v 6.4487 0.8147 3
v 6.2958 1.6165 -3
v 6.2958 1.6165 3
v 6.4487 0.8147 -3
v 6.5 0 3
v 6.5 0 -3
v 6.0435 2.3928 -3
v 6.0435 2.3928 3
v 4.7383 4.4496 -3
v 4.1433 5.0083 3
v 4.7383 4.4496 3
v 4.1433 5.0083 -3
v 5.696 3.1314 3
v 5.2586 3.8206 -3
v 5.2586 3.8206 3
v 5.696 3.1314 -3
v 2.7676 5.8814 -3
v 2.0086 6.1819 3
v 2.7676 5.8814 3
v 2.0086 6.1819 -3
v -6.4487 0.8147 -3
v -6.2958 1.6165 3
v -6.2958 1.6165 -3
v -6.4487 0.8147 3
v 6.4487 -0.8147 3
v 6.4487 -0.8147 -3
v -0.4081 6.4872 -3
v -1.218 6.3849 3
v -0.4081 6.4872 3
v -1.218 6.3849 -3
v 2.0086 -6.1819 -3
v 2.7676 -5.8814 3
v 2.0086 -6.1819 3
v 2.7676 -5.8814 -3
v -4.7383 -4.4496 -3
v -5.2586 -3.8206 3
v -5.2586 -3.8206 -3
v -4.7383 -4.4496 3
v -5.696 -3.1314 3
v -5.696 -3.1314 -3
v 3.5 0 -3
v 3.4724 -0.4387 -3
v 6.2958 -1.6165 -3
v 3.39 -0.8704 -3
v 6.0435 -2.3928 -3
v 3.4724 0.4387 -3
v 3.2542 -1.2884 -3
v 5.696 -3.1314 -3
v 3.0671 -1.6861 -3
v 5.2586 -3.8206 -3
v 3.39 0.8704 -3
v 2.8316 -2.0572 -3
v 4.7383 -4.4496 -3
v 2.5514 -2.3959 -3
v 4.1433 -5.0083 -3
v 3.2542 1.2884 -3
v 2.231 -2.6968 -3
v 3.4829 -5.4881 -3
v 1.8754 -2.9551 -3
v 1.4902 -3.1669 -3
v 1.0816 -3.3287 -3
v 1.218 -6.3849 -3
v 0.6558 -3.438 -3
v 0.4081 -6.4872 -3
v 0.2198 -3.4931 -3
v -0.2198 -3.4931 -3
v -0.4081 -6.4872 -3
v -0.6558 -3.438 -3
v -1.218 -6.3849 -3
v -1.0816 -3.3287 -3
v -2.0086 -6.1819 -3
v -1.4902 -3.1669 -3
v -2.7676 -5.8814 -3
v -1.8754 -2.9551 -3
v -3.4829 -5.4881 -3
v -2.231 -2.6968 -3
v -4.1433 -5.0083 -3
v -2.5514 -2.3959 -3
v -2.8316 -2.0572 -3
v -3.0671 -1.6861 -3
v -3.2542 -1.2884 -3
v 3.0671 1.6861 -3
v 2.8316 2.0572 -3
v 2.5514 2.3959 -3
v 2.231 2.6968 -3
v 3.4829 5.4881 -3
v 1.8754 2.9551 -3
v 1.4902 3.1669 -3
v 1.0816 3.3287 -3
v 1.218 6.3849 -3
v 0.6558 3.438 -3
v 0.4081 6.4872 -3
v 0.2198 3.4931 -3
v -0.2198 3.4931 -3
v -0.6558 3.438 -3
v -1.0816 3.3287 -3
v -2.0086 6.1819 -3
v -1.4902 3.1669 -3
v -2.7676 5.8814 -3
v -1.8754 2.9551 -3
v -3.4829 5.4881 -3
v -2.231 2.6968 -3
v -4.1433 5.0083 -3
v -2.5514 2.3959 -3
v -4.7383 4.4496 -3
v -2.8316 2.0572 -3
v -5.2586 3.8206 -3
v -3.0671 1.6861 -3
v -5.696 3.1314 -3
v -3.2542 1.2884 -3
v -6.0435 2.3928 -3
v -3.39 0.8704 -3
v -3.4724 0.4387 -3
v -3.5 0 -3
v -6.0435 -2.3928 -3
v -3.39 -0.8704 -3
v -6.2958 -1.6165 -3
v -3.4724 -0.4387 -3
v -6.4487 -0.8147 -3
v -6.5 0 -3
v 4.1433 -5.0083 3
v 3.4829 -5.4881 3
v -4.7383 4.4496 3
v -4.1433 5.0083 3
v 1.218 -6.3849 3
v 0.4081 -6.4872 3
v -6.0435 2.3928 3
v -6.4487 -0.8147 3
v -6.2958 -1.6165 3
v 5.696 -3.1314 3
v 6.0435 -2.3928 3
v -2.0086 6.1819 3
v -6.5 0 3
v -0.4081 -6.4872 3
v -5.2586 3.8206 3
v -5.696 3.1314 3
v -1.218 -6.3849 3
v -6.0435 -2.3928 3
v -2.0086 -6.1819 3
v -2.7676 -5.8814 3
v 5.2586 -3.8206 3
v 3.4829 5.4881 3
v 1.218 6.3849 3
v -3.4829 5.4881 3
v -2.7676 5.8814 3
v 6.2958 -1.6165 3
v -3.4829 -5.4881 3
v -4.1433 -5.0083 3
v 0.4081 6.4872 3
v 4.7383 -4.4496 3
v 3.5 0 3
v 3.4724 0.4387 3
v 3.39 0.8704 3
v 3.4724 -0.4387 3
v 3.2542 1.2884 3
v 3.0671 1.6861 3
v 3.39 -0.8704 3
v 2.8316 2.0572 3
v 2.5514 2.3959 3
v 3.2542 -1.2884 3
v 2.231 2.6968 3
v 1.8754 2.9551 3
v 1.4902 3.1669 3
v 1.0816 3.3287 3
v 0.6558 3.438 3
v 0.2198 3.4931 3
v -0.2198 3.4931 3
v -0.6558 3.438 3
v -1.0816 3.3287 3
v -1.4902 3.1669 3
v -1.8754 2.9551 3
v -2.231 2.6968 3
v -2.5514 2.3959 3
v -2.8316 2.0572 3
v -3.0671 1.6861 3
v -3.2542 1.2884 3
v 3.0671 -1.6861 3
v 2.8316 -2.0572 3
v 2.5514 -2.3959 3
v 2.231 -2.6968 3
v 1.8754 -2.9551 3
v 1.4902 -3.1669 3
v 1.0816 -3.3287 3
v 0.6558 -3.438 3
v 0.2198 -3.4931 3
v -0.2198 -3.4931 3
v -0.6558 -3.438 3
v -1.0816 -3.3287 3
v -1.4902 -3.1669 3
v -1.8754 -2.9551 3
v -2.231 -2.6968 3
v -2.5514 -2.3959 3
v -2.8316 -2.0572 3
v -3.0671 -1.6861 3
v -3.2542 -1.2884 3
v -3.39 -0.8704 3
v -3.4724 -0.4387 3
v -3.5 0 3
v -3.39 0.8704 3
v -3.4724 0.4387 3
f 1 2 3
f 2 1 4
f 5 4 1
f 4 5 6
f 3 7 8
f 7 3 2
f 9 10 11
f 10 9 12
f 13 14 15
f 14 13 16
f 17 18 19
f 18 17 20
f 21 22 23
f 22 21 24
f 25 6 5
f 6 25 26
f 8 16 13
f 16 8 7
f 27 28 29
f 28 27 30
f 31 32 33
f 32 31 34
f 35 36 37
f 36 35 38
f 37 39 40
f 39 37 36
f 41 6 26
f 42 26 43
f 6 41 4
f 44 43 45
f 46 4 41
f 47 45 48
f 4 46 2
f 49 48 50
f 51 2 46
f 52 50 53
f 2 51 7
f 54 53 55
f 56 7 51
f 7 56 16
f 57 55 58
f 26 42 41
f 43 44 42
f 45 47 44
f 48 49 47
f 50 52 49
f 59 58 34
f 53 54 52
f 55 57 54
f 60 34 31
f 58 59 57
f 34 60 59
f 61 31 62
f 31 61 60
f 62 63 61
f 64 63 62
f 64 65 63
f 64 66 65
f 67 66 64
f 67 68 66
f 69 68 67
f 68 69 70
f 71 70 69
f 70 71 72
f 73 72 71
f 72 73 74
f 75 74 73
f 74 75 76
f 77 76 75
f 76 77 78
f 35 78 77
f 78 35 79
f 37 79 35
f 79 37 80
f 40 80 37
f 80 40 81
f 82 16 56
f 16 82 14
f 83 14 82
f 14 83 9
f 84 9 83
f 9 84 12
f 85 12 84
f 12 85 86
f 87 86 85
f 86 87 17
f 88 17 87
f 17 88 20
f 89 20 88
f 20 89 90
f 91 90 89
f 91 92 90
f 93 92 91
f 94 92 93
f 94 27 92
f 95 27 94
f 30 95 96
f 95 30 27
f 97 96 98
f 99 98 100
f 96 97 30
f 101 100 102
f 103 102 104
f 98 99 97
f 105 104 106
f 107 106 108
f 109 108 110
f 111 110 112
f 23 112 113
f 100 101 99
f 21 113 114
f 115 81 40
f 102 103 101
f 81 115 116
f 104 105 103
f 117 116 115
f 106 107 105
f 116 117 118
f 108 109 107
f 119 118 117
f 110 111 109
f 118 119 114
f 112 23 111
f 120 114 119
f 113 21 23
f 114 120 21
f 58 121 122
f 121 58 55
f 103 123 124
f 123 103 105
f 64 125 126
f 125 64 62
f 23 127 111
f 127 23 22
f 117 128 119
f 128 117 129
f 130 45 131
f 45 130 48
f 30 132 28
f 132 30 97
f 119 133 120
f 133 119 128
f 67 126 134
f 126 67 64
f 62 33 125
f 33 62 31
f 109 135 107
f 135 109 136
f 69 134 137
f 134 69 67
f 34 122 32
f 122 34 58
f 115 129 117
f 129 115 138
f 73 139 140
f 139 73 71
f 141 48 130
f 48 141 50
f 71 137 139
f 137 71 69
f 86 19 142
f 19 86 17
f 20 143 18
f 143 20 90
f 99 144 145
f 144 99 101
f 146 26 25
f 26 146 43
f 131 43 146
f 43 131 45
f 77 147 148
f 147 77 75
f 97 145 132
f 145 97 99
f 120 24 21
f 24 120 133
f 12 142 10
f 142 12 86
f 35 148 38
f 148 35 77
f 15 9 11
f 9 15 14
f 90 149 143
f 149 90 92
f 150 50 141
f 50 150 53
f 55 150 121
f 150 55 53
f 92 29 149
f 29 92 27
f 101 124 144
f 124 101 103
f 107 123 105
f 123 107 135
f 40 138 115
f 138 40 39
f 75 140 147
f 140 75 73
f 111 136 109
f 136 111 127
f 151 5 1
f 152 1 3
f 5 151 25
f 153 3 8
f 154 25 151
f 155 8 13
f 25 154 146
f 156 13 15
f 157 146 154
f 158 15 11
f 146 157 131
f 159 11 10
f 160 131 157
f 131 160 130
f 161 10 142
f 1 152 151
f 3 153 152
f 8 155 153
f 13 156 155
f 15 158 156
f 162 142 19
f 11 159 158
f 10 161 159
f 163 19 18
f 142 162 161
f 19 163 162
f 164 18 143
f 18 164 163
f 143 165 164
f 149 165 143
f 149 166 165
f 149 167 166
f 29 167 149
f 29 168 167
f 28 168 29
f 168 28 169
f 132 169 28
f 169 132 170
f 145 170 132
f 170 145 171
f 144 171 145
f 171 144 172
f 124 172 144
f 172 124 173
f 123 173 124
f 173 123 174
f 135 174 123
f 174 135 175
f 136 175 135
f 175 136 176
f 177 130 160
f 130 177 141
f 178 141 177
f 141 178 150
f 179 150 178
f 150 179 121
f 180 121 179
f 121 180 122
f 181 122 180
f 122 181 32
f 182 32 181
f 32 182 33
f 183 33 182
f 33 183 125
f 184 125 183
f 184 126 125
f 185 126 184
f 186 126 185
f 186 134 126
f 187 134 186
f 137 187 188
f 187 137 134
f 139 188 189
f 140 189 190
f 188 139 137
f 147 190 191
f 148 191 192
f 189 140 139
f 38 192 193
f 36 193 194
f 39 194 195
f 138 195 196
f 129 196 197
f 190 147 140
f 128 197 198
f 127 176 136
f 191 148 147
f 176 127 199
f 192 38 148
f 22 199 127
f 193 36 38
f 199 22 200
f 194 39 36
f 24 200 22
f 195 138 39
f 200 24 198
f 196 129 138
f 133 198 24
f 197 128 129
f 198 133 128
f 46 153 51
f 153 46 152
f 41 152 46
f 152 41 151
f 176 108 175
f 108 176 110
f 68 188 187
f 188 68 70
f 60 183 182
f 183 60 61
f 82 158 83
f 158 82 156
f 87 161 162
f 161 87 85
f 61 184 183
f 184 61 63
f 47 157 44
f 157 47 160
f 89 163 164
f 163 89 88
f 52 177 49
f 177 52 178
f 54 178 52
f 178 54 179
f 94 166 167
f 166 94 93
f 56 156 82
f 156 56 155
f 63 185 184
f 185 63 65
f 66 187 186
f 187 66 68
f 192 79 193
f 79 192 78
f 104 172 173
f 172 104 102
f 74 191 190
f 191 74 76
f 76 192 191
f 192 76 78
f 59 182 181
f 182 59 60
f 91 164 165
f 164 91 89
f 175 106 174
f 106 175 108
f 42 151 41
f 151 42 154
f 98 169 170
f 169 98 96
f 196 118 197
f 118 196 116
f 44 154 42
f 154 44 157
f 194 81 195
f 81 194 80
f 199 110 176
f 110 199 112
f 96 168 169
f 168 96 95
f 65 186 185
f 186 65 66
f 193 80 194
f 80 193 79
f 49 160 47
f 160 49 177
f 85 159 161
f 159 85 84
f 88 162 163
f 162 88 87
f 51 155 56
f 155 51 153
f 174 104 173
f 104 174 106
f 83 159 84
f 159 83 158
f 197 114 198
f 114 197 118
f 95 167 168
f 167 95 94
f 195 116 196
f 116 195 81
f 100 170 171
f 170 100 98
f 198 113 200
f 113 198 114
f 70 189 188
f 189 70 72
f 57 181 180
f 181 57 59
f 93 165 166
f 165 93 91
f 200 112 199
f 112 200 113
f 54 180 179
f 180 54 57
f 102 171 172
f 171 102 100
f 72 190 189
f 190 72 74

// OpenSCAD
$fn = 50;


difference() {
	union() {
		translate(v = [0, 0, -3.0000000000]) {
			cylinder(h = 6, r = 6.5000000000);
		}
	}
	union() {
		translate(v = [0, 0, -100.0000000000]) {
			cylinder(h = 200, r = 3.5000000000);
		}
	}
}
